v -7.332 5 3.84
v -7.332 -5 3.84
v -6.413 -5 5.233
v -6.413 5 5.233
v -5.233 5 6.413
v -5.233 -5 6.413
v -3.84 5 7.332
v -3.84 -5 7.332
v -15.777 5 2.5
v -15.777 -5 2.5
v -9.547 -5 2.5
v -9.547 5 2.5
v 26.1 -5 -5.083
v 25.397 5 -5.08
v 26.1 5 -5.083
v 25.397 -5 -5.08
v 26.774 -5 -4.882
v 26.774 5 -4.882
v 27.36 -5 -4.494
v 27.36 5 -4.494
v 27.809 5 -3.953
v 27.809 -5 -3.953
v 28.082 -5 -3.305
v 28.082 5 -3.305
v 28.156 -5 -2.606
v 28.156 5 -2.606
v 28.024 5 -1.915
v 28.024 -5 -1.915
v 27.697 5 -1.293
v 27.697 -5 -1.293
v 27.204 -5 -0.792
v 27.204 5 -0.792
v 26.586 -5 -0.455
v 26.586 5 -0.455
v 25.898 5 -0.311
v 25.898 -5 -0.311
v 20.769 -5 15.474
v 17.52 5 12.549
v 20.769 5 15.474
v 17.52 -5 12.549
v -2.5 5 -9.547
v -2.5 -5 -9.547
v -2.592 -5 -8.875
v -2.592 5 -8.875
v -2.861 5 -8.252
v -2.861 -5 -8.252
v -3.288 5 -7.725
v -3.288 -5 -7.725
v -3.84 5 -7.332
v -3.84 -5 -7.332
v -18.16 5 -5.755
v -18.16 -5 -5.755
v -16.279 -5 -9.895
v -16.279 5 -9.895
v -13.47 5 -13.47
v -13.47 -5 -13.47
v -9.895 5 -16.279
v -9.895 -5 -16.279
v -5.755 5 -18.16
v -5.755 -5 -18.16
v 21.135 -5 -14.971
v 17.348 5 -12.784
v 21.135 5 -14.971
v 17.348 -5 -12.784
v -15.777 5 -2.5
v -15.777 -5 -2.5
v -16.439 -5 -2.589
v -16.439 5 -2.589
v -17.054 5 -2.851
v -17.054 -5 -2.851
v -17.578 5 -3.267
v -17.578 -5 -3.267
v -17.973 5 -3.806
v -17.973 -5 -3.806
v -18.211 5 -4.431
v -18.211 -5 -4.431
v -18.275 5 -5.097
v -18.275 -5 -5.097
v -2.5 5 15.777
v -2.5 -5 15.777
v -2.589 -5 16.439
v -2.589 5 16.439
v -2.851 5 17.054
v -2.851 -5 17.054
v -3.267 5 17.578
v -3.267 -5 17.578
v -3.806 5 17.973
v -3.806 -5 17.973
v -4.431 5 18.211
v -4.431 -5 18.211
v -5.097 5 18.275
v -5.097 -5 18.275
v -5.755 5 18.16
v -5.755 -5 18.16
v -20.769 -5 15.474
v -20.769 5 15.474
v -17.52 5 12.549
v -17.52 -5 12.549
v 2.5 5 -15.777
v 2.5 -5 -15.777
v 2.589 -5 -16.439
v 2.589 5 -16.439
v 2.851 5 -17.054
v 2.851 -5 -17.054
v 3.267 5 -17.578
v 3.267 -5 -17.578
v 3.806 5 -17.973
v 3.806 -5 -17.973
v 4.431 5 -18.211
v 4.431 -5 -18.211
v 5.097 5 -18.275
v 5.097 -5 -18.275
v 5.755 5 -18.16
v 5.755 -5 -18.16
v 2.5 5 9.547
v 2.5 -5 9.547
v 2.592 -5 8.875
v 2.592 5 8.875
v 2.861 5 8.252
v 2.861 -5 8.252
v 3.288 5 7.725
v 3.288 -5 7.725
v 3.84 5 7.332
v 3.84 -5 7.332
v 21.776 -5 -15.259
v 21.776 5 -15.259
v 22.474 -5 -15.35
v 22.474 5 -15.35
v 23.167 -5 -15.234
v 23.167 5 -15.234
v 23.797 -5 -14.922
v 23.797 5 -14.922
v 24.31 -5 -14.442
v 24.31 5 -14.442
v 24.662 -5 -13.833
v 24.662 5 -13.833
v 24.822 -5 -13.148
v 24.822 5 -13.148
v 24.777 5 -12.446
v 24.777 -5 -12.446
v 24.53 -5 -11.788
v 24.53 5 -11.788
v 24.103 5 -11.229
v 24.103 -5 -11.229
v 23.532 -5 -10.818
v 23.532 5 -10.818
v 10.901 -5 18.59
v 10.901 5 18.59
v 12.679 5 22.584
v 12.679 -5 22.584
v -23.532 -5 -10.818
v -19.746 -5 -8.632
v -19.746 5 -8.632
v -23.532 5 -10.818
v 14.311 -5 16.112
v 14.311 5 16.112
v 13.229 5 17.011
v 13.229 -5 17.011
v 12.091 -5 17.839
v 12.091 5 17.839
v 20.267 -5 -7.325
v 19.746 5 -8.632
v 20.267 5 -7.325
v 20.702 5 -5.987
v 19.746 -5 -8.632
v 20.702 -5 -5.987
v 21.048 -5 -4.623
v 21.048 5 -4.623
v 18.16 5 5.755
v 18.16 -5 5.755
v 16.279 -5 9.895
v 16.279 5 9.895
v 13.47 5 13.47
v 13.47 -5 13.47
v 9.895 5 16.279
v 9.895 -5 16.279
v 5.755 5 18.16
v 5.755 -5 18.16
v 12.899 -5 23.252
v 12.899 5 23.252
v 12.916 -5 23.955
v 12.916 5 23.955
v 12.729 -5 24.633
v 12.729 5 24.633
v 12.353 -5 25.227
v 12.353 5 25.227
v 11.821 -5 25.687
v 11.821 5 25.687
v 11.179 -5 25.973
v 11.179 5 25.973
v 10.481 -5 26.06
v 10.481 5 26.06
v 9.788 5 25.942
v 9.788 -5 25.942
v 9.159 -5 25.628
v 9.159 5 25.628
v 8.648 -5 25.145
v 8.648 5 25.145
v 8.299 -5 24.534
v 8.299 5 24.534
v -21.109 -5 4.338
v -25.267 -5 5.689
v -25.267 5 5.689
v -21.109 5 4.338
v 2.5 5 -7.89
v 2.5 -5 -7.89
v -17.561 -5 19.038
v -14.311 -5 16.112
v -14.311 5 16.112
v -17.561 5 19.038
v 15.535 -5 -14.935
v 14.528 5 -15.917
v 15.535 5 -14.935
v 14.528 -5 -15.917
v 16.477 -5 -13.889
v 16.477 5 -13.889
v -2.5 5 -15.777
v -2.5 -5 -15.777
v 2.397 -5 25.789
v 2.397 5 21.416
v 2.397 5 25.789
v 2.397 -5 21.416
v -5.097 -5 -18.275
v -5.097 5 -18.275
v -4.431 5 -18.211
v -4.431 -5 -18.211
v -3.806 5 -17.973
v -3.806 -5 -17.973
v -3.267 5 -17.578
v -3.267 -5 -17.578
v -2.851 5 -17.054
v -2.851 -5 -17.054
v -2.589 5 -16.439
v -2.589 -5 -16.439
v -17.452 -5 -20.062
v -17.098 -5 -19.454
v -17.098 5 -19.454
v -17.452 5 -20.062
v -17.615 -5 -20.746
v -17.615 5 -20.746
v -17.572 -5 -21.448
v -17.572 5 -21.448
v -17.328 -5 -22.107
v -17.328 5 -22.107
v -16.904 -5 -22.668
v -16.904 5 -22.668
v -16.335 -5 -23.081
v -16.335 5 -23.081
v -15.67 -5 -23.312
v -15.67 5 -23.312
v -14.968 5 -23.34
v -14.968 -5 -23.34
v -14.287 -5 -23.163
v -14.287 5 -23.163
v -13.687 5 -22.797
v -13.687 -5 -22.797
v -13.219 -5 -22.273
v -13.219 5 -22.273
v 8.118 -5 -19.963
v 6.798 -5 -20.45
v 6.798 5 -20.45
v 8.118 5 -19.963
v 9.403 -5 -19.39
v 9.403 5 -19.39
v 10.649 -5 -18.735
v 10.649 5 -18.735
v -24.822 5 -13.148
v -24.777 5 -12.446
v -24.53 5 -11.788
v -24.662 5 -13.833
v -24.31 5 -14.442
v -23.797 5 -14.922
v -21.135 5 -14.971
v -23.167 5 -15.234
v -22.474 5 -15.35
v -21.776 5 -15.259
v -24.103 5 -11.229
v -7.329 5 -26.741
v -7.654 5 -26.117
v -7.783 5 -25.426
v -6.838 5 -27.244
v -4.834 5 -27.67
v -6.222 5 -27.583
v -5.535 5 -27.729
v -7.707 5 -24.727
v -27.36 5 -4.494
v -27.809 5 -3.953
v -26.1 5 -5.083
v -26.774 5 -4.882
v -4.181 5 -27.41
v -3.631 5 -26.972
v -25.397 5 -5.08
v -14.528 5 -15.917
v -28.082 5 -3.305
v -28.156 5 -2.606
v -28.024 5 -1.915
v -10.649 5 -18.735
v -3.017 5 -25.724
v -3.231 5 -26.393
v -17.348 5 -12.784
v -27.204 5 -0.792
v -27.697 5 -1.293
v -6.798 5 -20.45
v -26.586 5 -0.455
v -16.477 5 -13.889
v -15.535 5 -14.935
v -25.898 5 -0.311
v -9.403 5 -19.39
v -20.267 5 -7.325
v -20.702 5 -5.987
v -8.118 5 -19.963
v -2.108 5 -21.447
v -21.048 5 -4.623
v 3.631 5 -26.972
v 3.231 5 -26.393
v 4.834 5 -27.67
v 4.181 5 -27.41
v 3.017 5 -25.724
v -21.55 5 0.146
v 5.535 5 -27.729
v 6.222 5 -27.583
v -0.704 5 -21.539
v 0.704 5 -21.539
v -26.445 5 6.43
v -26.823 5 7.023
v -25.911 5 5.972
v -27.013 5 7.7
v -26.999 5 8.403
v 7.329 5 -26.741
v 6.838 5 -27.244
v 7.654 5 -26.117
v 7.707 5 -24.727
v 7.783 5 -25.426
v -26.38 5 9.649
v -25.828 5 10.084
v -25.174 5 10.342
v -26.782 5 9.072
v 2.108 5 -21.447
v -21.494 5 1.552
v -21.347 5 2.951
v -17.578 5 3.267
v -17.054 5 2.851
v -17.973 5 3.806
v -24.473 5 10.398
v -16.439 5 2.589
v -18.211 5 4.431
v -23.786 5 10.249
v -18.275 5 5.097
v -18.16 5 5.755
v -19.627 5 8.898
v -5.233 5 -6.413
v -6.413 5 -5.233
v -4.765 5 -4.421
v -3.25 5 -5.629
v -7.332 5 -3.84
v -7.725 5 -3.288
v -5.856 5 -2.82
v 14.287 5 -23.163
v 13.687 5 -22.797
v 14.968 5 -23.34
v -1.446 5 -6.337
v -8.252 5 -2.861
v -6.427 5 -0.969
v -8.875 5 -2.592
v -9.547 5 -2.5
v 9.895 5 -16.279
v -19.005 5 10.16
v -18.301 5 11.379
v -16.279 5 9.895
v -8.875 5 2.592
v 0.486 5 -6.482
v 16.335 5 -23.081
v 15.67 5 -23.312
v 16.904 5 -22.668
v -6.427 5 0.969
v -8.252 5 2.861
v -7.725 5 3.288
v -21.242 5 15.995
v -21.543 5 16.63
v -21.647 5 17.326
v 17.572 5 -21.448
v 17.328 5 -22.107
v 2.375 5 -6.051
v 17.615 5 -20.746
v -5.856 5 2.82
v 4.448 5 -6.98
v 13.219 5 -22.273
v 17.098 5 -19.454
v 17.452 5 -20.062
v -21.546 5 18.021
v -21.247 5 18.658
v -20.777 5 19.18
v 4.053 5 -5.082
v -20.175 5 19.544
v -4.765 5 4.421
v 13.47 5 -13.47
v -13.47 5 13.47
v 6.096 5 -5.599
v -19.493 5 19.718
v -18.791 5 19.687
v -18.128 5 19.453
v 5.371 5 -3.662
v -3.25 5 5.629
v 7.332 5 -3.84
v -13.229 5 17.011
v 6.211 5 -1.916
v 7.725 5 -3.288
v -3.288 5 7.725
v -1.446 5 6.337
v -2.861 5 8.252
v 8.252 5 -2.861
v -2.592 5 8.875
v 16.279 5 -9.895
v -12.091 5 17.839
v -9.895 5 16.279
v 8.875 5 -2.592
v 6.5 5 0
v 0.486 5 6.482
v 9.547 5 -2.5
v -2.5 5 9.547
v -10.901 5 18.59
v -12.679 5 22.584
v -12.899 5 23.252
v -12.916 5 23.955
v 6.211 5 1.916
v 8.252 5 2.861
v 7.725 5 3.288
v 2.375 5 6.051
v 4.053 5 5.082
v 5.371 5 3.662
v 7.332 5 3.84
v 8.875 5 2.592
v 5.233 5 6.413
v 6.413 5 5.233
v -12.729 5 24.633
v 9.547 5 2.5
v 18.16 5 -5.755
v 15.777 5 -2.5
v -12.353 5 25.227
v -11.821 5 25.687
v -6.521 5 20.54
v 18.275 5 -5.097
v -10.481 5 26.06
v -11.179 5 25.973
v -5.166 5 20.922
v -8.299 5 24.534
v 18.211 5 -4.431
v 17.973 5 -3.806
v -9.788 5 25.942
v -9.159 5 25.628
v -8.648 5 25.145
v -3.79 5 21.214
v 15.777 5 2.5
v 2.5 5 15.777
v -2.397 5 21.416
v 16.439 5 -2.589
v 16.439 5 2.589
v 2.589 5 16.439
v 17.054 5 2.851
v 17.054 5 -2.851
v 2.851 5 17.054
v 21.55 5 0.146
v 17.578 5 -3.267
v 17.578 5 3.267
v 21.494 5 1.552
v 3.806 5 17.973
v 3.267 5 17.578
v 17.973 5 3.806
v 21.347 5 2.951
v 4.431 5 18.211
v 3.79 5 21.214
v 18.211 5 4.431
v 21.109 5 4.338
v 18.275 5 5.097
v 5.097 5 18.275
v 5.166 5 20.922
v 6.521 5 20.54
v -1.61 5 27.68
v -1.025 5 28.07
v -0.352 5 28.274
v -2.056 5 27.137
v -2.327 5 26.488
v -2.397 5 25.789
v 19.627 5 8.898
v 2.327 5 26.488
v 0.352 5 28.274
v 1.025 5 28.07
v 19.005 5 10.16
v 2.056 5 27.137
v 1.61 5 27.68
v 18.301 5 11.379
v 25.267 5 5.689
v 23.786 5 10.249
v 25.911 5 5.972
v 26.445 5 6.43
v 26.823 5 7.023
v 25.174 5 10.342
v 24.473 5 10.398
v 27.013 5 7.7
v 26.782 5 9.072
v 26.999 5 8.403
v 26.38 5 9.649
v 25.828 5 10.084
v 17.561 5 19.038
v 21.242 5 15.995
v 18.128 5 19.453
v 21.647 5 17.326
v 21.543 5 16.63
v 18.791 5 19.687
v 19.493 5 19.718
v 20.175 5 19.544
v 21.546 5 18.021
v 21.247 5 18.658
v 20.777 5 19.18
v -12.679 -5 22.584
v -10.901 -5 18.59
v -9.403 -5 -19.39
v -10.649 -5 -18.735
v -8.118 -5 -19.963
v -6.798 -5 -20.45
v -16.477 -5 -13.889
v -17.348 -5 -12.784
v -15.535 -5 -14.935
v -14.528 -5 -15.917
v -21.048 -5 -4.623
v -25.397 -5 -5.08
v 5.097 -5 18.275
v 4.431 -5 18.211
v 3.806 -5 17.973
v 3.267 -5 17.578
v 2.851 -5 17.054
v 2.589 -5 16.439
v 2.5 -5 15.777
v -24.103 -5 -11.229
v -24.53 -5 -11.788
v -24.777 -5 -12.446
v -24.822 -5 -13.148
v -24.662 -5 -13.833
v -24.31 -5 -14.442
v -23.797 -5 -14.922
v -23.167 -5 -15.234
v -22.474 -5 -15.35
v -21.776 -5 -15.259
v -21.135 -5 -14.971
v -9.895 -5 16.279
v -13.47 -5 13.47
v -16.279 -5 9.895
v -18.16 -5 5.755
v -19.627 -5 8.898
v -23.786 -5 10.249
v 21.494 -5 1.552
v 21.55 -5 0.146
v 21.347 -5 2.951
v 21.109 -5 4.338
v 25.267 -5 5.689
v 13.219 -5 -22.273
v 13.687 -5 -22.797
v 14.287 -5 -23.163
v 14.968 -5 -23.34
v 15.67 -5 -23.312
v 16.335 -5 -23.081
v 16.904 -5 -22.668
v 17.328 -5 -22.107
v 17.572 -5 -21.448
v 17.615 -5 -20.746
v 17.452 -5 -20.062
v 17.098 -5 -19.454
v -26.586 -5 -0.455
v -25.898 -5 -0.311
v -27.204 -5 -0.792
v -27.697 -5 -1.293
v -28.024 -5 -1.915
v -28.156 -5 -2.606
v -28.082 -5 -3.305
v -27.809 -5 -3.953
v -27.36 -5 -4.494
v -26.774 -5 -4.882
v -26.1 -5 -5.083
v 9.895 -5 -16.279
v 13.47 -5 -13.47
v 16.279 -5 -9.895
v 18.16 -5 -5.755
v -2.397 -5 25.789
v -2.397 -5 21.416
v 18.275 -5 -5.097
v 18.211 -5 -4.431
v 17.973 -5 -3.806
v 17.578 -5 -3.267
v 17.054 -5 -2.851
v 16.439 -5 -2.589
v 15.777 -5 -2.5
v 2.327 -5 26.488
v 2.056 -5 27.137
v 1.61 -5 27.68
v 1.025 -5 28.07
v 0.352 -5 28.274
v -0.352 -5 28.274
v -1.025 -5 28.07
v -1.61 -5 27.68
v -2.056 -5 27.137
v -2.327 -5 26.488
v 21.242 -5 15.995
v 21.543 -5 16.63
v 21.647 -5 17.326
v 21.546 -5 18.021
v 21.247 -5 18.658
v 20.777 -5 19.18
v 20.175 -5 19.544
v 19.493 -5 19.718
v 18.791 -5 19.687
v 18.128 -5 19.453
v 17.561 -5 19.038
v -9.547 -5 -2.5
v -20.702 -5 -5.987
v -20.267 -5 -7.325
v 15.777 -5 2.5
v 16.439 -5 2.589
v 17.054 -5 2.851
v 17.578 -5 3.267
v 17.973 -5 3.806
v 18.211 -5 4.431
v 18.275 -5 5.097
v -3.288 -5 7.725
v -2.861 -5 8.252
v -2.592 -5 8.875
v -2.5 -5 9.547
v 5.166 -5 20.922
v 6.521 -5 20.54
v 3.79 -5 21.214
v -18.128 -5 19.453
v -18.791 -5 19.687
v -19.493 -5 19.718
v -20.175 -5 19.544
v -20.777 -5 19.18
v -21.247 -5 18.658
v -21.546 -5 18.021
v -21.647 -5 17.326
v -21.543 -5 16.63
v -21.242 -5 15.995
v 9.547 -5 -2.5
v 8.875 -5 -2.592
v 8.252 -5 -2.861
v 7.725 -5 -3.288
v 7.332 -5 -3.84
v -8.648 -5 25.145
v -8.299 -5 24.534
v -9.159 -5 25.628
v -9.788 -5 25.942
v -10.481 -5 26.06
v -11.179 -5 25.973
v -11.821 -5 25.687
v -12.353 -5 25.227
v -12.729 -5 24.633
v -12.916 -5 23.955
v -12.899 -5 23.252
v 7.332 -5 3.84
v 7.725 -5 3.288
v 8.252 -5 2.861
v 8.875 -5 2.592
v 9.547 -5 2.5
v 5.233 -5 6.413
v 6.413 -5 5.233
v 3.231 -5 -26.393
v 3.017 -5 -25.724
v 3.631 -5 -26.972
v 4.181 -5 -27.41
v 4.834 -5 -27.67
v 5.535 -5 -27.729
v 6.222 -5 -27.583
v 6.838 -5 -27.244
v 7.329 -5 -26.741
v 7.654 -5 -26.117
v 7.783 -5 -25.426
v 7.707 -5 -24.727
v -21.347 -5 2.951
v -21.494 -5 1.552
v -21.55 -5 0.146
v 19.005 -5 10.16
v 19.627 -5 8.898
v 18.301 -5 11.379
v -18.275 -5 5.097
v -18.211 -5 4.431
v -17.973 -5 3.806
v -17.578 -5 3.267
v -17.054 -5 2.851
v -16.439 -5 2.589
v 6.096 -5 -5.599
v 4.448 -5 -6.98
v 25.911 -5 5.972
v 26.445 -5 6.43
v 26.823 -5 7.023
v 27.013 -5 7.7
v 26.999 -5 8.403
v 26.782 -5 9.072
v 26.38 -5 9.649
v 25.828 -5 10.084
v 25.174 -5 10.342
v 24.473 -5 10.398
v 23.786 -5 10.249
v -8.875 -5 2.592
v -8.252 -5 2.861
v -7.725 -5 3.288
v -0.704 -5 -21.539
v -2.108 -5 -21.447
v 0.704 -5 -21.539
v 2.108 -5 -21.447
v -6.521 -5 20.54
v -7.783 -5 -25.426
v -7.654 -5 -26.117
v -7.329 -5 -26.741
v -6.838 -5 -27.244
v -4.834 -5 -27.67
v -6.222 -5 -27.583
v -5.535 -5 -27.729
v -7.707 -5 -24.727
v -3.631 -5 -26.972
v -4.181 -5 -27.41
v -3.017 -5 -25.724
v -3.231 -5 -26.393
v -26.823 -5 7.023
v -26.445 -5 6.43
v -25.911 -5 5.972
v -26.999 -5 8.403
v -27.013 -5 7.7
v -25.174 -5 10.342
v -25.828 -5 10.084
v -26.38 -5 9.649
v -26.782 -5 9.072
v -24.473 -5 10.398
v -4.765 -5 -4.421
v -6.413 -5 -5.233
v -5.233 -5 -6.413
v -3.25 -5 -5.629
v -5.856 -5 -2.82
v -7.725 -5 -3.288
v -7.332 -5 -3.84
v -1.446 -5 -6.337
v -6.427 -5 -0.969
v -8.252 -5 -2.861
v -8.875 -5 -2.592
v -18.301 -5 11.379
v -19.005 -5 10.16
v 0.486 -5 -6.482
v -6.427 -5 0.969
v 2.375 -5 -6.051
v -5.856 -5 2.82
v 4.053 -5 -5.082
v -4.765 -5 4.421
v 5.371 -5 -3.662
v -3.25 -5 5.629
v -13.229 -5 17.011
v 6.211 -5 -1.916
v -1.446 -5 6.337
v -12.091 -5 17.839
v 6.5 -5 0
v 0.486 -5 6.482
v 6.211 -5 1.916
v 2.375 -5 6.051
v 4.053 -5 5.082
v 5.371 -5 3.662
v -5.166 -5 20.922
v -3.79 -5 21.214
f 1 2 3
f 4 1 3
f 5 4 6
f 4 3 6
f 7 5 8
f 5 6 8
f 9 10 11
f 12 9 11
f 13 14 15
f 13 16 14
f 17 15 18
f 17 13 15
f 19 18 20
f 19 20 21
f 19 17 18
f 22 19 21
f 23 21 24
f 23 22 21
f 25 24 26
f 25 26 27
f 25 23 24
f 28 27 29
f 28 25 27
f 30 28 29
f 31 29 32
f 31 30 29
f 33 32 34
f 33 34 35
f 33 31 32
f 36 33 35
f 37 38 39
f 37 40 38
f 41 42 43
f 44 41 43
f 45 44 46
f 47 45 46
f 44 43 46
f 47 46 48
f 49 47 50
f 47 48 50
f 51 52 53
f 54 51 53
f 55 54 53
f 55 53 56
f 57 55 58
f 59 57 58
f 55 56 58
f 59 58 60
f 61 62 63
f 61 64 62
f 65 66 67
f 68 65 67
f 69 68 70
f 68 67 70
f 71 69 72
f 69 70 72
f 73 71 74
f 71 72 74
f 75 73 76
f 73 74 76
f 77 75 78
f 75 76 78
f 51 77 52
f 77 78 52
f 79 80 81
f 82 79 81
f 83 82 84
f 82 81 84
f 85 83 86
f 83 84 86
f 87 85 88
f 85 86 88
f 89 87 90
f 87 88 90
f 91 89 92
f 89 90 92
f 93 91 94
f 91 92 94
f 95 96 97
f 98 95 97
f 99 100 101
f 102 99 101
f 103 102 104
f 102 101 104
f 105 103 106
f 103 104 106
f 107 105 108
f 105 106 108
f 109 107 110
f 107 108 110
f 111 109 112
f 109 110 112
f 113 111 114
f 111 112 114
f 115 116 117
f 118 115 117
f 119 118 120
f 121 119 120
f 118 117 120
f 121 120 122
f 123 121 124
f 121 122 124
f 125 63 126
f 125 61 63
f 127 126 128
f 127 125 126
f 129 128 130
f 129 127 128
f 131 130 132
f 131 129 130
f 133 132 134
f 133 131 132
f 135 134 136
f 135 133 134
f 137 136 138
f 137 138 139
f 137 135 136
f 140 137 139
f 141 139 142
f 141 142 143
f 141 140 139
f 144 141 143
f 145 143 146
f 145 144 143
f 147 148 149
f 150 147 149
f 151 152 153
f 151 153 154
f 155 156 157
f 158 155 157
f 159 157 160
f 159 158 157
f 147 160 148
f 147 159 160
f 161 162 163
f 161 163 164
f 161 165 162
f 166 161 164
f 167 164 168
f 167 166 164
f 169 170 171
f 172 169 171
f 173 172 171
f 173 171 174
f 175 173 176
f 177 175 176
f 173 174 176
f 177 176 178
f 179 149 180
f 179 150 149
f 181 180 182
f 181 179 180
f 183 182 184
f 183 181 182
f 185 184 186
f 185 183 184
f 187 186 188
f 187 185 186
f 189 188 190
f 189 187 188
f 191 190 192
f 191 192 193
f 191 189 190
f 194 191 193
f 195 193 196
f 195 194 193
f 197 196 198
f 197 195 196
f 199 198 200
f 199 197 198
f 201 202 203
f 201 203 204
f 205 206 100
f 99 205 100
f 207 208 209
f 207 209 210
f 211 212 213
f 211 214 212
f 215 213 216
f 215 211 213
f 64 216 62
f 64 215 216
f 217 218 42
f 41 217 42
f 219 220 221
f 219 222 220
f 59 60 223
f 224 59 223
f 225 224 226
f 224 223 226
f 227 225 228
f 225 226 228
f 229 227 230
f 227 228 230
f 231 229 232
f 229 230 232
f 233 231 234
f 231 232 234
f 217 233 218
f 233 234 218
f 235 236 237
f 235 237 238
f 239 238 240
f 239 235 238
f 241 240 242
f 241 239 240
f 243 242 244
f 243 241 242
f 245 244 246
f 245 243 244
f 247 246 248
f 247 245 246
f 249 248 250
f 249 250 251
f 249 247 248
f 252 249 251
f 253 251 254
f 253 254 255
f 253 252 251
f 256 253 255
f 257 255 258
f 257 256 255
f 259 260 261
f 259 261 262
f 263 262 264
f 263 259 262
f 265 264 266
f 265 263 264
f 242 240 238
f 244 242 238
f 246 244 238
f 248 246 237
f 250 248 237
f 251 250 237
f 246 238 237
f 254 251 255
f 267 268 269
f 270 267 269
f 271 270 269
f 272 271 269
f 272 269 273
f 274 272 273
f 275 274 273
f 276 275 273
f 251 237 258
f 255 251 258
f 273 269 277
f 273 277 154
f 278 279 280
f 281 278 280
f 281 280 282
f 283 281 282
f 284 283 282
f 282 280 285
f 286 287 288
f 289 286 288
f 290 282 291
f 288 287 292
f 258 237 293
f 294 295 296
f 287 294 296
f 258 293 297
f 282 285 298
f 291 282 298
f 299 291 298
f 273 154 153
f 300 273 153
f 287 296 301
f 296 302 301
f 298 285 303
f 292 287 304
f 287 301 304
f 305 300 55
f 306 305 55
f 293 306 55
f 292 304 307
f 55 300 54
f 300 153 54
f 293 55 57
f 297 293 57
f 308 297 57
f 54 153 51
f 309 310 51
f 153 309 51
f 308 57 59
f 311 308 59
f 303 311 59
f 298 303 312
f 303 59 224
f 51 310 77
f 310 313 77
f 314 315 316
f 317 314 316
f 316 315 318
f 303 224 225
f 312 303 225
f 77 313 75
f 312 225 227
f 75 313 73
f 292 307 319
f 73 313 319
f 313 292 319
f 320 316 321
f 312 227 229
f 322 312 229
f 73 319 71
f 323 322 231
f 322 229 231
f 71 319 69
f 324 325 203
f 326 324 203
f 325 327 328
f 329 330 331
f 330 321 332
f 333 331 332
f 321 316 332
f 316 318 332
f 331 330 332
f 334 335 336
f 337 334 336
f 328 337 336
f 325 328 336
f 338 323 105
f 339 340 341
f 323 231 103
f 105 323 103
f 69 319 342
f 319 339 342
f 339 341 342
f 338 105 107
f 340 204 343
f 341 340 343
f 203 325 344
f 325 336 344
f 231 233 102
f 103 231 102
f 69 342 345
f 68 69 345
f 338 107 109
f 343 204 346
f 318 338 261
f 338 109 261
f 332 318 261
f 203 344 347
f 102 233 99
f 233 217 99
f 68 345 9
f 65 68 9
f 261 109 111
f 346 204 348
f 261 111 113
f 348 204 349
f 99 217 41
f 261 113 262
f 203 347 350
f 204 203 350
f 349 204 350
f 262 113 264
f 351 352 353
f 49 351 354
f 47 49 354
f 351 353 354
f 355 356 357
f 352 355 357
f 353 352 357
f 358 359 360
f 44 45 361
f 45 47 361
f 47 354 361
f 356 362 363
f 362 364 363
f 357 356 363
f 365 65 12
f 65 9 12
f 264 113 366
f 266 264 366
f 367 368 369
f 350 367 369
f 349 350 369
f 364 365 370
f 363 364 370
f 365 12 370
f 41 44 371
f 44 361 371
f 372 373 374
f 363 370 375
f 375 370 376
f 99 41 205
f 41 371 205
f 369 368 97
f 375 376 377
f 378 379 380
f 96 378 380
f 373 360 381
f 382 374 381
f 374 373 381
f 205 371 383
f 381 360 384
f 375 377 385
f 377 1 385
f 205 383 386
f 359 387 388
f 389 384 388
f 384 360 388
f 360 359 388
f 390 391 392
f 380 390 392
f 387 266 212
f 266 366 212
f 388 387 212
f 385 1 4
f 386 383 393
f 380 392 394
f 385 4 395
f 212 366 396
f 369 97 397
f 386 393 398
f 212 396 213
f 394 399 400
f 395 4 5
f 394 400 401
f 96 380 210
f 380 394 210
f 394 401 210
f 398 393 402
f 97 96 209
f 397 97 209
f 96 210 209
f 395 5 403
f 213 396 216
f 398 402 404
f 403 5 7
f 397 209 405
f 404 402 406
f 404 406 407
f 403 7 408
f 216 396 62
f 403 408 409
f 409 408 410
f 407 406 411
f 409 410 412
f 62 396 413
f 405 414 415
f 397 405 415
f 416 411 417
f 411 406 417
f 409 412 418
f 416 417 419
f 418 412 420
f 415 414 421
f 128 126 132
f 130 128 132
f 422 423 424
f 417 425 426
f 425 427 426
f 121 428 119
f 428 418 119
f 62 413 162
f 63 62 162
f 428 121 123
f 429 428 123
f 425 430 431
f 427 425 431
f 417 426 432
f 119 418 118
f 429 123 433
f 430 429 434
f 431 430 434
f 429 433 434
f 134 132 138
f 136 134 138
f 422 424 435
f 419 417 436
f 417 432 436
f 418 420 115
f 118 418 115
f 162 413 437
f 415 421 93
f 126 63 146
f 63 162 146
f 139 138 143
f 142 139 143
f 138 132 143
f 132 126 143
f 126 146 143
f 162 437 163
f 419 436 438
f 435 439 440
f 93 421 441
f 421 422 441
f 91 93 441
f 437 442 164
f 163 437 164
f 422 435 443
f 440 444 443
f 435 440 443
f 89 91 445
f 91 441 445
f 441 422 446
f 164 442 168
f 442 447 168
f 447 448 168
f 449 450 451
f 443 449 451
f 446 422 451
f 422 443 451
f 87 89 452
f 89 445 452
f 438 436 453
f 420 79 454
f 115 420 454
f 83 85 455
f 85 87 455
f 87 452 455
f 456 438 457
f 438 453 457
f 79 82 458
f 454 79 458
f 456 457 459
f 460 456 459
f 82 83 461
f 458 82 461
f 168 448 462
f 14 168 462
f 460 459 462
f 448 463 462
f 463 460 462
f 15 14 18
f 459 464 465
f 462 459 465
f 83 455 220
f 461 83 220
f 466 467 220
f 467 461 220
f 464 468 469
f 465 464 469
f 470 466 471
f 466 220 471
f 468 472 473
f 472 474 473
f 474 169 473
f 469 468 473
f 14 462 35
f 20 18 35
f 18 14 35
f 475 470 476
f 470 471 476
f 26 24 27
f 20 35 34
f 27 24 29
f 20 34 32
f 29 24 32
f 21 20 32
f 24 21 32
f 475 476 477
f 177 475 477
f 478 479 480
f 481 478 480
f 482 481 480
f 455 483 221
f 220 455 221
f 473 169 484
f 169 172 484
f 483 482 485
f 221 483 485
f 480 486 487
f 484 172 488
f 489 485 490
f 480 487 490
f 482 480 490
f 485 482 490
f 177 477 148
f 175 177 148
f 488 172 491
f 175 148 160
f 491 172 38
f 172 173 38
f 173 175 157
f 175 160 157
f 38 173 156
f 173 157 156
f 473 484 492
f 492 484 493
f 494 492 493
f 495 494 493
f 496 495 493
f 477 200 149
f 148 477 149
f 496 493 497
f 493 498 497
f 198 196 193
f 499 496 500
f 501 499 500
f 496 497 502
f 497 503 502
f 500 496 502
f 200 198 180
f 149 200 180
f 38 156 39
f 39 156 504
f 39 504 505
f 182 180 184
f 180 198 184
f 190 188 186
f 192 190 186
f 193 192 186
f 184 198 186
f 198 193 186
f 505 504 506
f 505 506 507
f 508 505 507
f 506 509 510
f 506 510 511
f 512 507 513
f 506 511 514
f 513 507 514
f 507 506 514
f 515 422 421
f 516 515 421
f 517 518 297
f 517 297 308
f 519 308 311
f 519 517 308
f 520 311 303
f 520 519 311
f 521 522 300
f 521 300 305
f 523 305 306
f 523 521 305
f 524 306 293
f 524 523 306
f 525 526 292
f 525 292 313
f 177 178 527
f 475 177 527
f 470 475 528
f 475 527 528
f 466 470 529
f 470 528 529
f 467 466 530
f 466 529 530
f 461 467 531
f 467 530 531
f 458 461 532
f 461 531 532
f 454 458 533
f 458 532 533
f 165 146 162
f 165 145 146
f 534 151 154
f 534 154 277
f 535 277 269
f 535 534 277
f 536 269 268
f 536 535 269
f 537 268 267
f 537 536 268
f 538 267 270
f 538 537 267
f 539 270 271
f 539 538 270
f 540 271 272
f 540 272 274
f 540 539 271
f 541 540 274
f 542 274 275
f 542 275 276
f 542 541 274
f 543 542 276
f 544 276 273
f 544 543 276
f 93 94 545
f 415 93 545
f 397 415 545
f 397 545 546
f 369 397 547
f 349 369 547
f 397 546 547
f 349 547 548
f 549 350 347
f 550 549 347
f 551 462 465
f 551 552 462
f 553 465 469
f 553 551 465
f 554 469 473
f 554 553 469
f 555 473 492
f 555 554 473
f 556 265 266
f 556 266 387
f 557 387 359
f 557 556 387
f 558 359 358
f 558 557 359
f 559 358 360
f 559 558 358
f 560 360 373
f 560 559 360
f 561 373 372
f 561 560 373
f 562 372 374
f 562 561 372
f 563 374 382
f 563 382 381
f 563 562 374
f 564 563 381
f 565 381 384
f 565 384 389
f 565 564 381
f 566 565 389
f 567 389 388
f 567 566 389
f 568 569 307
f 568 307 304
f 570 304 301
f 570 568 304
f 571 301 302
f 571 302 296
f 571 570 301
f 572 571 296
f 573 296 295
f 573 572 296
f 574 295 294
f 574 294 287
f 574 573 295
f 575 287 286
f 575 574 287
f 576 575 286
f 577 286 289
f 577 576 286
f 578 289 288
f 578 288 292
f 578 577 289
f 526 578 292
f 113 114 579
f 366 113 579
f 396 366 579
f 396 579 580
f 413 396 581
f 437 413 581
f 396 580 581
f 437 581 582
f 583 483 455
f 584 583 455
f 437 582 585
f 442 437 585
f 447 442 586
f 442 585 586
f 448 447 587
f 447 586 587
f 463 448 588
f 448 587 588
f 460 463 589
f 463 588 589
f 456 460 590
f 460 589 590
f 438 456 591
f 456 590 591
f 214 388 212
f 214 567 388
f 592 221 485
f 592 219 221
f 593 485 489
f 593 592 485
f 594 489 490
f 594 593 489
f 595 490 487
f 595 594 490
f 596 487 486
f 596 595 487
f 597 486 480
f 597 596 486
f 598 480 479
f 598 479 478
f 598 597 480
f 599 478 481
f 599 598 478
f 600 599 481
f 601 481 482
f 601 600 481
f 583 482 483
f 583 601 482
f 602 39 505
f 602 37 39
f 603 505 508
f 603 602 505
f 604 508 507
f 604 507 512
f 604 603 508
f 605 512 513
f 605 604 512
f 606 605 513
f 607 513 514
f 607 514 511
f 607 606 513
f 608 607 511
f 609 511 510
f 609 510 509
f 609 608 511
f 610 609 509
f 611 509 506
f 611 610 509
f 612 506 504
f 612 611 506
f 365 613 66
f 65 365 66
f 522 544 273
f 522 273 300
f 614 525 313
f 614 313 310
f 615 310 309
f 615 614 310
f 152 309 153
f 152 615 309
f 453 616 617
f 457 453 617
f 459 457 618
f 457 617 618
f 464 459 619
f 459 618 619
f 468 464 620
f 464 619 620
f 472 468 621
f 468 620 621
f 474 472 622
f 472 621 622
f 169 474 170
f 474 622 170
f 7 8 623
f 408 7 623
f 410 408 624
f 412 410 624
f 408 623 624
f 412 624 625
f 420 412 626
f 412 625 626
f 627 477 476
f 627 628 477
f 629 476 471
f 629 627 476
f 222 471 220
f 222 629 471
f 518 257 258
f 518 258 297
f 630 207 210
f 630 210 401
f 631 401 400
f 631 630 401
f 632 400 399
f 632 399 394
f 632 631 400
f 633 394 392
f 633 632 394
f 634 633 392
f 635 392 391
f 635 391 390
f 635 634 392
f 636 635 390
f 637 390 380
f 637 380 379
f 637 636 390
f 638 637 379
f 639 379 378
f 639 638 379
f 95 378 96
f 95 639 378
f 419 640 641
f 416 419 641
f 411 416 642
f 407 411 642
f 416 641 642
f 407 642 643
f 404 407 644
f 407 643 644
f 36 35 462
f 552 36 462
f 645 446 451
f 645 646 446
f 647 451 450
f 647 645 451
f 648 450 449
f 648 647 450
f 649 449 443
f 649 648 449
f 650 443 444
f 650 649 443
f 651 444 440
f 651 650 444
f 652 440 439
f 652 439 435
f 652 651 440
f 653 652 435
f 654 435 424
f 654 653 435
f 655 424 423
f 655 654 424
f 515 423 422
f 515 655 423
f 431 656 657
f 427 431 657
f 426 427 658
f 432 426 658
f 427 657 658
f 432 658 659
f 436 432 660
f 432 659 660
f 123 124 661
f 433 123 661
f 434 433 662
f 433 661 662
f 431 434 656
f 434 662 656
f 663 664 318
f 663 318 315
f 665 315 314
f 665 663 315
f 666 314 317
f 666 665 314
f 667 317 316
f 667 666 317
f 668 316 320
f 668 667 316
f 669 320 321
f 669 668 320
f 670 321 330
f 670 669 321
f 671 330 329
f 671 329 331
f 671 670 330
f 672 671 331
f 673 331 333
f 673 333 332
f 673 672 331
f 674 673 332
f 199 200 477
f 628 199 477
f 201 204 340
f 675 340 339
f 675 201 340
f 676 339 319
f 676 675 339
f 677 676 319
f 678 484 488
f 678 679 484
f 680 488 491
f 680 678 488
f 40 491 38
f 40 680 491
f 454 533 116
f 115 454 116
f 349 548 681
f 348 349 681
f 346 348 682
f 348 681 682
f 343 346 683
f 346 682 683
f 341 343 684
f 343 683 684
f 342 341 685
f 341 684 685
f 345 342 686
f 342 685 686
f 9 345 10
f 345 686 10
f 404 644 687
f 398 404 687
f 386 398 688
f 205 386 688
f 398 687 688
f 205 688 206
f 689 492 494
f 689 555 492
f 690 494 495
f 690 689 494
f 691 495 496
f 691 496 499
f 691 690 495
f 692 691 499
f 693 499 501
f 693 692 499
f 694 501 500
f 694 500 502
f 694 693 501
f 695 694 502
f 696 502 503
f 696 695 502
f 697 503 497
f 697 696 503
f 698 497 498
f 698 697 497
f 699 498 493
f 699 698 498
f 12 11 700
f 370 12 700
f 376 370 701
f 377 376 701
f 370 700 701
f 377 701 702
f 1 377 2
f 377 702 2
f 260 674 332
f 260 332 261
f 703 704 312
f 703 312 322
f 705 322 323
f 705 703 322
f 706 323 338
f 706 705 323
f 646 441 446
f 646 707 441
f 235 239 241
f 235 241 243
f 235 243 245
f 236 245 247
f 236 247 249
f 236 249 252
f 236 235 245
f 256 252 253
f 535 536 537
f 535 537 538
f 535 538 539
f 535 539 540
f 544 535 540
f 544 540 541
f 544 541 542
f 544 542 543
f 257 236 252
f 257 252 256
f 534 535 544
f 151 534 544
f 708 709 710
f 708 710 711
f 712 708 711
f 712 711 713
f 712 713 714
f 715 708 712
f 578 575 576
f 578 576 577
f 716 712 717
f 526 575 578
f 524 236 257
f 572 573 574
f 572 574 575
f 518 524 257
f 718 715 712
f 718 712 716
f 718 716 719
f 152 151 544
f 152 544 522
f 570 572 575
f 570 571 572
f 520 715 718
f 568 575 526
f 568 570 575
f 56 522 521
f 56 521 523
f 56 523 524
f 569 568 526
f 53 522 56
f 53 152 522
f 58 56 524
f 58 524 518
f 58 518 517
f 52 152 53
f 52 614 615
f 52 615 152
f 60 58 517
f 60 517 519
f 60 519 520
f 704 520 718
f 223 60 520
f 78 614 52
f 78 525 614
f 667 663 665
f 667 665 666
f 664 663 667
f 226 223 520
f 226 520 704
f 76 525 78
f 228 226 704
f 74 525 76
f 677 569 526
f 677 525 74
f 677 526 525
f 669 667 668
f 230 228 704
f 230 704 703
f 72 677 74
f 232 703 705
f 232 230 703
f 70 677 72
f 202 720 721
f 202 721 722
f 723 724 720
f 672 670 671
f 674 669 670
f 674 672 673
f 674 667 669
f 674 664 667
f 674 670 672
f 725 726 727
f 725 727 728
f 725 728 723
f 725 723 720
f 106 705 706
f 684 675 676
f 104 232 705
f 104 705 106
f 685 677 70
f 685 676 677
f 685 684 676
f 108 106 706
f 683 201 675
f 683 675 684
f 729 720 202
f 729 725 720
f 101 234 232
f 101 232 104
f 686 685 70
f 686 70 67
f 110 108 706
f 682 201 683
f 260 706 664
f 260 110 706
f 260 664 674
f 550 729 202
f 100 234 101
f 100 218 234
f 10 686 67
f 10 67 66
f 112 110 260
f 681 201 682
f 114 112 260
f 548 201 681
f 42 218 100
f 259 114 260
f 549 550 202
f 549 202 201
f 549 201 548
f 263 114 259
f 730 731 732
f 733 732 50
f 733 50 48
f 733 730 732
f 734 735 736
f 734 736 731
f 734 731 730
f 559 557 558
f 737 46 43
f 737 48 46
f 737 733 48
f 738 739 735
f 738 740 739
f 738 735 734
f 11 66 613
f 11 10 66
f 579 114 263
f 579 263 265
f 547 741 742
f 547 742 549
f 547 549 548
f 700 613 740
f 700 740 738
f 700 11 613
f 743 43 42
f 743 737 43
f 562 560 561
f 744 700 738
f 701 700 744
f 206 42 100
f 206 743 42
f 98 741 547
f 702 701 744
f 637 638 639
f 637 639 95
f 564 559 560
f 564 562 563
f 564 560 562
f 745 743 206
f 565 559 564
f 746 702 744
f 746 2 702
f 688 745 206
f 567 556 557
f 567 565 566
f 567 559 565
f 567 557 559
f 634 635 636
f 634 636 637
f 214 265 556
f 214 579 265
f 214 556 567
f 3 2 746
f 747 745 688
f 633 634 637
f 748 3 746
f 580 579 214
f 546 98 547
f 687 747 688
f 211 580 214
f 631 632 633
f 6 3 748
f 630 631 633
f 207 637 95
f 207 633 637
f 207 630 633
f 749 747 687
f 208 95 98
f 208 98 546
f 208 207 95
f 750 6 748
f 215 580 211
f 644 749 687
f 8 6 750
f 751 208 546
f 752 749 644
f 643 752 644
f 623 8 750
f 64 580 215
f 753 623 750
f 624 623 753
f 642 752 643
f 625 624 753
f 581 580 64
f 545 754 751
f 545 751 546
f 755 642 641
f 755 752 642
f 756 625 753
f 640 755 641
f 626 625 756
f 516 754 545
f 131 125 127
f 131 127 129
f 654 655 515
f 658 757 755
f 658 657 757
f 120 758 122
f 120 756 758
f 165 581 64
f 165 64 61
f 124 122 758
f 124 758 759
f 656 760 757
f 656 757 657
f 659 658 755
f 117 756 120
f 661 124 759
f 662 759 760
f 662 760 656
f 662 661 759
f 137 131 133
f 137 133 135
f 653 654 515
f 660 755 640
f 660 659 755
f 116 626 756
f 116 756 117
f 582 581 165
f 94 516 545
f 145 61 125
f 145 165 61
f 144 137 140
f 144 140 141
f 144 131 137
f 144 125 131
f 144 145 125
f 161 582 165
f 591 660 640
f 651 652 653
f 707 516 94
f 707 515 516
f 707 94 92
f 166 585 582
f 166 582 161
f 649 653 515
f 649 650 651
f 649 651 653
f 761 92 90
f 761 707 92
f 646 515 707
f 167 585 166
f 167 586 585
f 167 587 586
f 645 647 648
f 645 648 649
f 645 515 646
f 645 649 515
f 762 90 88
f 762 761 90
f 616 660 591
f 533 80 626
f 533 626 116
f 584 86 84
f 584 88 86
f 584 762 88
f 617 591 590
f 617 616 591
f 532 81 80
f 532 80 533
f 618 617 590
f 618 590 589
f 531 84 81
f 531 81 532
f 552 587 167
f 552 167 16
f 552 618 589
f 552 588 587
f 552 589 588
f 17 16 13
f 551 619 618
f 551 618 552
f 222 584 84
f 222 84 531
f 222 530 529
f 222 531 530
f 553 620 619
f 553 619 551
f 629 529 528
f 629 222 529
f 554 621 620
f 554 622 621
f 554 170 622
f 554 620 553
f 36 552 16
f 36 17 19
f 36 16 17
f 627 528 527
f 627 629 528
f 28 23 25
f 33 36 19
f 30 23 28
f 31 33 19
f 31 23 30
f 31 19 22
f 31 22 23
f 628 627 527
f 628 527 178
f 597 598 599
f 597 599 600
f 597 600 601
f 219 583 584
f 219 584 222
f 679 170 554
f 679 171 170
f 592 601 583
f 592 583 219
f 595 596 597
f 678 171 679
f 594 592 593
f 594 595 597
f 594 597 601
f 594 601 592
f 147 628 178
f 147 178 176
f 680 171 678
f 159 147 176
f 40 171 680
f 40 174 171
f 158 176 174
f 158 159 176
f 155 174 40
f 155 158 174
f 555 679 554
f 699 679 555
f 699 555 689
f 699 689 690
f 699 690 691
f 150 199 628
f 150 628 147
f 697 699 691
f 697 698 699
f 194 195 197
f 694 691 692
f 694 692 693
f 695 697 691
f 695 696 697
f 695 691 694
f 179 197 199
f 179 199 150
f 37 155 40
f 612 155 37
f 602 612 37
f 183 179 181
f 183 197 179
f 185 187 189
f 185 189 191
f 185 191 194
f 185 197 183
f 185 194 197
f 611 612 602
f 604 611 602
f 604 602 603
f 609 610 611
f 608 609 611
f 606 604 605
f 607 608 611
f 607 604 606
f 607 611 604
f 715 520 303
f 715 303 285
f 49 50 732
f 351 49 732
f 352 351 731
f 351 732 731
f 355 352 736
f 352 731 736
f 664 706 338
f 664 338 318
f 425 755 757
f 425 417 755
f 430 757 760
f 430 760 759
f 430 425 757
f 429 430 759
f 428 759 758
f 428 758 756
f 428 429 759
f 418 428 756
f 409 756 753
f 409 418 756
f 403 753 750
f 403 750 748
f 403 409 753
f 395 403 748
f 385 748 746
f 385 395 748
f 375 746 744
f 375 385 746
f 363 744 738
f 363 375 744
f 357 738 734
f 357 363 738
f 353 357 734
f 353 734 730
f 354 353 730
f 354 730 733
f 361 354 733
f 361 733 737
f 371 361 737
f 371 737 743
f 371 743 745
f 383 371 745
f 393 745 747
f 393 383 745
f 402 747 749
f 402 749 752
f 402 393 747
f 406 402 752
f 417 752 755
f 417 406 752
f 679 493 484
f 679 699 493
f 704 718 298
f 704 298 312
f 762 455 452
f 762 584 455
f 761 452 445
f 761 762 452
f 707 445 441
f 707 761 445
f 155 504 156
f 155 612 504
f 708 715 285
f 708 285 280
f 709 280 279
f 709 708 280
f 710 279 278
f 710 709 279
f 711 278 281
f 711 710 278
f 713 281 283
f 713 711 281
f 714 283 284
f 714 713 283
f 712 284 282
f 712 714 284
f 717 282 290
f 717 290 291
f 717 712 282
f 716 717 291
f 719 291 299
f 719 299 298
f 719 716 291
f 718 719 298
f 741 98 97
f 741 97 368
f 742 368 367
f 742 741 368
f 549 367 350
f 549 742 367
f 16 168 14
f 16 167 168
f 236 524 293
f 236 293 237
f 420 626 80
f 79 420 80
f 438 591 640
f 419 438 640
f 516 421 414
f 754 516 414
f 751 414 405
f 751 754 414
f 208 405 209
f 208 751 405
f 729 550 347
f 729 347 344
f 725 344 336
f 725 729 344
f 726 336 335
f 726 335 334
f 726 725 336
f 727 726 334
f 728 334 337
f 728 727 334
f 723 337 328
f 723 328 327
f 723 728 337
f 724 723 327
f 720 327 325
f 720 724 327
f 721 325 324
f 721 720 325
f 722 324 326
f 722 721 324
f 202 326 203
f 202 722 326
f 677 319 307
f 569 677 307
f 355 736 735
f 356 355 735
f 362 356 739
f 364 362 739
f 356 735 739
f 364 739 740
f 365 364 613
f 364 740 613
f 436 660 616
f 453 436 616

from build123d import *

# Parameters (mm, degrees)
F0_R     = 6.5
F1_DEPTH = 5
F3_DEPTH = 10


with BuildPart() as f1:
    # F0 (on Front) → F1 (new body, symmetric)
    with BuildSketch(Plane.XZ):
        with BuildLine():
            Line((-12.679406, 22.584124), (-10.90092, 18.589579))
            ThreePointArc((-10.90092, 18.589579), (-12.666772, 17.434316), (-14.311171, 16.111887))
            Line((-14.311171, 16.111887), (-17.560627, 19.03771))
            ThreePointArc((-17.560627, 19.03771), (-21.030999, 18.936396), (-20.769004, 15.474445))
            Line((-20.769004, 15.474445), (-17.519549, 12.548622))
            ThreePointArc((-17.519549, 12.548622), (-18.662847, 10.775), (-19.6272, 8.898063))
            Line((-19.6272, 8.898063), (-23.785765, 10.249263))
            ThreePointArc((-23.785765, 10.249263), (-26.914899, 8.745181), (-25.267454, 5.689094))
            Line((-25.267454, 5.689094), (-21.108888, 4.337894))
            ThreePointArc((-21.108888, 4.337894), (-21.431947, 2.252588), (-21.549508, 0.145684))
            Line((-21.549508, 0.145684), (-25.898128, -0.311375))
            ThreePointArc((-25.898128, -0.311375), (-28.14497, -2.958156), (-25.39693, -5.079953))
            Line((-25.39693, -5.079953), (-21.04831, -4.622895))
            ThreePointArc((-21.04831, -4.622895), (-20.495268, -6.659316), (-19.74571, -8.631886))
            Line((-19.74571, -8.631886), (-23.53247, -10.818173))
            ThreePointArc((-23.53247, -10.818173), (-24.508519, -14.15), (-21.135047, -14.97063))
            Line((-21.135047, -14.97063), (-17.348287, -12.784343))
            ThreePointArc((-17.348287, -12.784343), (-16.014771, -14.419765), (-14.527699, -15.916924))
            Line((-14.527699, -15.916924), (-17.097834, -19.45441))
            ThreePointArc((-17.097834, -19.45441), (-16.634323, -22.895181), (-13.218722, -22.27275))
            Line((-13.218722, -22.27275), (-10.648588, -18.735263))
            ThreePointArc((-10.648588, -18.735263), (-8.765175, -19.686905), (-6.797718, -20.449781))
            Line((-6.797718, -20.449781), (-7.706827, -24.726804))
            ThreePointArc((-7.706827, -24.726804), (-5.883901, -27.681577), (-3.01676, -25.723708))
            Line((-3.01676, -25.723708), (-2.107651, -21.446685))
            ThreePointArc((-2.107651, -21.446685), (0, -21.55), (2.107651, -21.446685))
            Line((2.107651, -21.446685), (3.01676, -25.723708))
            ThreePointArc((3.01676, -25.723708), (5.883901, -27.681577), (7.706827, -24.726804))
            Line((7.706827, -24.726804), (6.797718, -20.449781))
            ThreePointArc((6.797718, -20.449781), (8.765175, -19.686905), (10.648588, -18.735263))
            Line((10.648588, -18.735263), (13.218722, -22.27275))
            ThreePointArc((13.218722, -22.27275), (16.634323, -22.895181), (17.097834, -19.45441))
            Line((17.097834, -19.45441), (14.527699, -15.916924))
            ThreePointArc((14.527699, -15.916924), (16.014771, -14.419765), (17.348287, -12.784343))
            Line((17.348287, -12.784343), (21.135047, -14.97063))
            ThreePointArc((21.135047, -14.97063), (24.508519, -14.15), (23.53247, -10.818173))
            Line((23.53247, -10.818173), (19.74571, -8.631886))
            ThreePointArc((19.74571, -8.631886), (20.495268, -6.659316), (21.04831, -4.622895))
            Line((21.04831, -4.622895), (25.39693, -5.079953))
            ThreePointArc((25.39693, -5.079953), (28.14497, -2.958156), (25.898128, -0.311375))
            Line((25.898128, -0.311375), (21.549508, 0.145684))
            ThreePointArc((21.549508, 0.145684), (21.431947, 2.252588), (21.108888, 4.337894))
            Line((21.108888, 4.337894), (25.267454, 5.689094))
            ThreePointArc((25.267454, 5.689094), (26.914899, 8.745181), (23.785765, 10.249263))
            Line((23.785765, 10.249263), (19.6272, 8.898063))
            ThreePointArc((19.6272, 8.898063), (18.662847, 10.775), (17.519549, 12.548622))
            Line((17.519549, 12.548622), (20.769004, 15.474445))
            ThreePointArc((20.769004, 15.474445), (21.030999, 18.936396), (17.560627, 19.03771))
            Line((17.560627, 19.03771), (14.311171, 16.111887))
            ThreePointArc((14.311171, 16.111887), (12.666772, 17.434316), (10.90092, 18.589579))
            Line((10.90092, 18.589579), (12.679406, 22.584124))
            ThreePointArc((12.679406, 22.584124), (11.510647, 25.853336), (8.299097, 24.534364))
            Line((8.299097, 24.534364), (6.520611, 20.539818))
            ThreePointArc((6.520611, 20.539818), (4.480497, 21.079081), (2.397423, 21.416229))
            Line((2.397423, 21.416229), (2.397423, 25.788803))
            ThreePointArc((2.397423, 25.788803), (0, 28.3), (-2.397423, 25.788803))
            Line((-2.397423, 25.788803), (-2.397423, 21.416229))
            ThreePointArc((-2.397423, 21.416229), (-4.480497, 21.079081), (-6.520611, 20.539818))
            Line((-6.520611, 20.539818), (-8.299097, 24.534364))
            ThreePointArc((-8.299097, 24.534364), (-11.510647, 25.853336), (-12.679406, 22.584124))
        make_face()
        Circle(F0_R, mode=Mode.SUBTRACT)
    extrude(amount=F1_DEPTH, both=True)

    # F2 (on face) → F3 (cut)
    with BuildSketch(Plane.XZ.offset(5)):
        with BuildLine():
            ThreePointArc((-5.755287, 18.159823), (-13.470384, 13.470384), (-18.159823, 5.755287))
            ThreePointArc((-18.159823, 5.755287), (-17.793847, 3.523216), (-15.776644, 2.5))
            Line((-15.776644, 2.5), (-9.54669, 2.5))
            ThreePointArc((-9.54669, 2.5), (-8.252423, 2.861104), (-7.332049, 3.8401))
            ThreePointArc((-7.332049, 3.8401), (-5.852577, 5.852577), (-3.8401, 7.332049))
            ThreePointArc((-3.8401, 7.332049), (-2.861104, 8.252423), (-2.5, 9.54669))
            Line((-2.5, 9.54669), (-2.5, 15.776644))
            ThreePointArc((-2.5, 15.776644), (-3.523216, 17.793847), (-5.755287, 18.159823))
        make_face()
        with BuildLine():
            ThreePointArc((5.755287, 18.159823), (3.523216, 17.793847), (2.5, 15.776644))
            Line((2.5, 15.776644), (2.5, 9.54669))
            ThreePointArc((2.5, 9.54669), (2.861104, 8.252423), (3.8401, 7.332049))
            ThreePointArc((3.8401, 7.332049), (5.852577, 5.852577), (7.332049, 3.8401))
            ThreePointArc((7.332049, 3.8401), (8.252423, 2.861104), (9.54669, 2.5))
            Line((9.54669, 2.5), (15.776644, 2.5))
            ThreePointArc((15.776644, 2.5), (17.793847, 3.523216), (18.159823, 5.755287))
            ThreePointArc((18.159823, 5.755287), (13.470384, 13.470384), (5.755287, 18.159823))
        make_face()
        with BuildLine():
            Line((-9.54669, -2.5), (-15.776644, -2.5))
            ThreePointArc((-15.776644, -2.5), (-17.793847, -3.523216), (-18.159823, -5.755287))
            ThreePointArc((-18.159823, -5.755287), (-13.470384, -13.470384), (-5.755287, -18.159823))
            ThreePointArc((-5.755287, -18.159823), (-3.523216, -17.793847), (-2.5, -15.776644))
            Line((-2.5, -15.776644), (-2.5, -9.54669))
            ThreePointArc((-2.5, -9.54669), (-2.861104, -8.252423), (-3.8401, -7.332049))
            ThreePointArc((-3.8401, -7.332049), (-5.852577, -5.852577), (-7.332049, -3.8401))
            ThreePointArc((-7.332049, -3.8401), (-8.252423, -2.861104), (-9.54669, -2.5))
        make_face()
        with BuildLine():
            Line((2.5, -7.890204), (2.5, -15.776644))
            ThreePointArc((2.5, -15.776644), (3.523216, -17.793847), (5.755287, -18.159823))
            ThreePointArc((5.755287, -18.159823), (13.470384, -13.470384), (18.159823, -5.755287))
            ThreePointArc((18.159823, -5.755287), (17.793847, -3.523216), (15.776644, -2.5))
            Line((15.776644, -2.5), (9.54669, -2.5))
            ThreePointArc((9.54669, -2.5), (8.252423, -2.861104), (7.332049, -3.8401))
            ThreePointArc((7.332049, -3.8401), (5.316778, -6.343278), (2.5, -7.890204))
        make_face()
    extrude(amount=-F3_DEPTH, mode=Mode.SUBTRACT)


solid = f1.part
